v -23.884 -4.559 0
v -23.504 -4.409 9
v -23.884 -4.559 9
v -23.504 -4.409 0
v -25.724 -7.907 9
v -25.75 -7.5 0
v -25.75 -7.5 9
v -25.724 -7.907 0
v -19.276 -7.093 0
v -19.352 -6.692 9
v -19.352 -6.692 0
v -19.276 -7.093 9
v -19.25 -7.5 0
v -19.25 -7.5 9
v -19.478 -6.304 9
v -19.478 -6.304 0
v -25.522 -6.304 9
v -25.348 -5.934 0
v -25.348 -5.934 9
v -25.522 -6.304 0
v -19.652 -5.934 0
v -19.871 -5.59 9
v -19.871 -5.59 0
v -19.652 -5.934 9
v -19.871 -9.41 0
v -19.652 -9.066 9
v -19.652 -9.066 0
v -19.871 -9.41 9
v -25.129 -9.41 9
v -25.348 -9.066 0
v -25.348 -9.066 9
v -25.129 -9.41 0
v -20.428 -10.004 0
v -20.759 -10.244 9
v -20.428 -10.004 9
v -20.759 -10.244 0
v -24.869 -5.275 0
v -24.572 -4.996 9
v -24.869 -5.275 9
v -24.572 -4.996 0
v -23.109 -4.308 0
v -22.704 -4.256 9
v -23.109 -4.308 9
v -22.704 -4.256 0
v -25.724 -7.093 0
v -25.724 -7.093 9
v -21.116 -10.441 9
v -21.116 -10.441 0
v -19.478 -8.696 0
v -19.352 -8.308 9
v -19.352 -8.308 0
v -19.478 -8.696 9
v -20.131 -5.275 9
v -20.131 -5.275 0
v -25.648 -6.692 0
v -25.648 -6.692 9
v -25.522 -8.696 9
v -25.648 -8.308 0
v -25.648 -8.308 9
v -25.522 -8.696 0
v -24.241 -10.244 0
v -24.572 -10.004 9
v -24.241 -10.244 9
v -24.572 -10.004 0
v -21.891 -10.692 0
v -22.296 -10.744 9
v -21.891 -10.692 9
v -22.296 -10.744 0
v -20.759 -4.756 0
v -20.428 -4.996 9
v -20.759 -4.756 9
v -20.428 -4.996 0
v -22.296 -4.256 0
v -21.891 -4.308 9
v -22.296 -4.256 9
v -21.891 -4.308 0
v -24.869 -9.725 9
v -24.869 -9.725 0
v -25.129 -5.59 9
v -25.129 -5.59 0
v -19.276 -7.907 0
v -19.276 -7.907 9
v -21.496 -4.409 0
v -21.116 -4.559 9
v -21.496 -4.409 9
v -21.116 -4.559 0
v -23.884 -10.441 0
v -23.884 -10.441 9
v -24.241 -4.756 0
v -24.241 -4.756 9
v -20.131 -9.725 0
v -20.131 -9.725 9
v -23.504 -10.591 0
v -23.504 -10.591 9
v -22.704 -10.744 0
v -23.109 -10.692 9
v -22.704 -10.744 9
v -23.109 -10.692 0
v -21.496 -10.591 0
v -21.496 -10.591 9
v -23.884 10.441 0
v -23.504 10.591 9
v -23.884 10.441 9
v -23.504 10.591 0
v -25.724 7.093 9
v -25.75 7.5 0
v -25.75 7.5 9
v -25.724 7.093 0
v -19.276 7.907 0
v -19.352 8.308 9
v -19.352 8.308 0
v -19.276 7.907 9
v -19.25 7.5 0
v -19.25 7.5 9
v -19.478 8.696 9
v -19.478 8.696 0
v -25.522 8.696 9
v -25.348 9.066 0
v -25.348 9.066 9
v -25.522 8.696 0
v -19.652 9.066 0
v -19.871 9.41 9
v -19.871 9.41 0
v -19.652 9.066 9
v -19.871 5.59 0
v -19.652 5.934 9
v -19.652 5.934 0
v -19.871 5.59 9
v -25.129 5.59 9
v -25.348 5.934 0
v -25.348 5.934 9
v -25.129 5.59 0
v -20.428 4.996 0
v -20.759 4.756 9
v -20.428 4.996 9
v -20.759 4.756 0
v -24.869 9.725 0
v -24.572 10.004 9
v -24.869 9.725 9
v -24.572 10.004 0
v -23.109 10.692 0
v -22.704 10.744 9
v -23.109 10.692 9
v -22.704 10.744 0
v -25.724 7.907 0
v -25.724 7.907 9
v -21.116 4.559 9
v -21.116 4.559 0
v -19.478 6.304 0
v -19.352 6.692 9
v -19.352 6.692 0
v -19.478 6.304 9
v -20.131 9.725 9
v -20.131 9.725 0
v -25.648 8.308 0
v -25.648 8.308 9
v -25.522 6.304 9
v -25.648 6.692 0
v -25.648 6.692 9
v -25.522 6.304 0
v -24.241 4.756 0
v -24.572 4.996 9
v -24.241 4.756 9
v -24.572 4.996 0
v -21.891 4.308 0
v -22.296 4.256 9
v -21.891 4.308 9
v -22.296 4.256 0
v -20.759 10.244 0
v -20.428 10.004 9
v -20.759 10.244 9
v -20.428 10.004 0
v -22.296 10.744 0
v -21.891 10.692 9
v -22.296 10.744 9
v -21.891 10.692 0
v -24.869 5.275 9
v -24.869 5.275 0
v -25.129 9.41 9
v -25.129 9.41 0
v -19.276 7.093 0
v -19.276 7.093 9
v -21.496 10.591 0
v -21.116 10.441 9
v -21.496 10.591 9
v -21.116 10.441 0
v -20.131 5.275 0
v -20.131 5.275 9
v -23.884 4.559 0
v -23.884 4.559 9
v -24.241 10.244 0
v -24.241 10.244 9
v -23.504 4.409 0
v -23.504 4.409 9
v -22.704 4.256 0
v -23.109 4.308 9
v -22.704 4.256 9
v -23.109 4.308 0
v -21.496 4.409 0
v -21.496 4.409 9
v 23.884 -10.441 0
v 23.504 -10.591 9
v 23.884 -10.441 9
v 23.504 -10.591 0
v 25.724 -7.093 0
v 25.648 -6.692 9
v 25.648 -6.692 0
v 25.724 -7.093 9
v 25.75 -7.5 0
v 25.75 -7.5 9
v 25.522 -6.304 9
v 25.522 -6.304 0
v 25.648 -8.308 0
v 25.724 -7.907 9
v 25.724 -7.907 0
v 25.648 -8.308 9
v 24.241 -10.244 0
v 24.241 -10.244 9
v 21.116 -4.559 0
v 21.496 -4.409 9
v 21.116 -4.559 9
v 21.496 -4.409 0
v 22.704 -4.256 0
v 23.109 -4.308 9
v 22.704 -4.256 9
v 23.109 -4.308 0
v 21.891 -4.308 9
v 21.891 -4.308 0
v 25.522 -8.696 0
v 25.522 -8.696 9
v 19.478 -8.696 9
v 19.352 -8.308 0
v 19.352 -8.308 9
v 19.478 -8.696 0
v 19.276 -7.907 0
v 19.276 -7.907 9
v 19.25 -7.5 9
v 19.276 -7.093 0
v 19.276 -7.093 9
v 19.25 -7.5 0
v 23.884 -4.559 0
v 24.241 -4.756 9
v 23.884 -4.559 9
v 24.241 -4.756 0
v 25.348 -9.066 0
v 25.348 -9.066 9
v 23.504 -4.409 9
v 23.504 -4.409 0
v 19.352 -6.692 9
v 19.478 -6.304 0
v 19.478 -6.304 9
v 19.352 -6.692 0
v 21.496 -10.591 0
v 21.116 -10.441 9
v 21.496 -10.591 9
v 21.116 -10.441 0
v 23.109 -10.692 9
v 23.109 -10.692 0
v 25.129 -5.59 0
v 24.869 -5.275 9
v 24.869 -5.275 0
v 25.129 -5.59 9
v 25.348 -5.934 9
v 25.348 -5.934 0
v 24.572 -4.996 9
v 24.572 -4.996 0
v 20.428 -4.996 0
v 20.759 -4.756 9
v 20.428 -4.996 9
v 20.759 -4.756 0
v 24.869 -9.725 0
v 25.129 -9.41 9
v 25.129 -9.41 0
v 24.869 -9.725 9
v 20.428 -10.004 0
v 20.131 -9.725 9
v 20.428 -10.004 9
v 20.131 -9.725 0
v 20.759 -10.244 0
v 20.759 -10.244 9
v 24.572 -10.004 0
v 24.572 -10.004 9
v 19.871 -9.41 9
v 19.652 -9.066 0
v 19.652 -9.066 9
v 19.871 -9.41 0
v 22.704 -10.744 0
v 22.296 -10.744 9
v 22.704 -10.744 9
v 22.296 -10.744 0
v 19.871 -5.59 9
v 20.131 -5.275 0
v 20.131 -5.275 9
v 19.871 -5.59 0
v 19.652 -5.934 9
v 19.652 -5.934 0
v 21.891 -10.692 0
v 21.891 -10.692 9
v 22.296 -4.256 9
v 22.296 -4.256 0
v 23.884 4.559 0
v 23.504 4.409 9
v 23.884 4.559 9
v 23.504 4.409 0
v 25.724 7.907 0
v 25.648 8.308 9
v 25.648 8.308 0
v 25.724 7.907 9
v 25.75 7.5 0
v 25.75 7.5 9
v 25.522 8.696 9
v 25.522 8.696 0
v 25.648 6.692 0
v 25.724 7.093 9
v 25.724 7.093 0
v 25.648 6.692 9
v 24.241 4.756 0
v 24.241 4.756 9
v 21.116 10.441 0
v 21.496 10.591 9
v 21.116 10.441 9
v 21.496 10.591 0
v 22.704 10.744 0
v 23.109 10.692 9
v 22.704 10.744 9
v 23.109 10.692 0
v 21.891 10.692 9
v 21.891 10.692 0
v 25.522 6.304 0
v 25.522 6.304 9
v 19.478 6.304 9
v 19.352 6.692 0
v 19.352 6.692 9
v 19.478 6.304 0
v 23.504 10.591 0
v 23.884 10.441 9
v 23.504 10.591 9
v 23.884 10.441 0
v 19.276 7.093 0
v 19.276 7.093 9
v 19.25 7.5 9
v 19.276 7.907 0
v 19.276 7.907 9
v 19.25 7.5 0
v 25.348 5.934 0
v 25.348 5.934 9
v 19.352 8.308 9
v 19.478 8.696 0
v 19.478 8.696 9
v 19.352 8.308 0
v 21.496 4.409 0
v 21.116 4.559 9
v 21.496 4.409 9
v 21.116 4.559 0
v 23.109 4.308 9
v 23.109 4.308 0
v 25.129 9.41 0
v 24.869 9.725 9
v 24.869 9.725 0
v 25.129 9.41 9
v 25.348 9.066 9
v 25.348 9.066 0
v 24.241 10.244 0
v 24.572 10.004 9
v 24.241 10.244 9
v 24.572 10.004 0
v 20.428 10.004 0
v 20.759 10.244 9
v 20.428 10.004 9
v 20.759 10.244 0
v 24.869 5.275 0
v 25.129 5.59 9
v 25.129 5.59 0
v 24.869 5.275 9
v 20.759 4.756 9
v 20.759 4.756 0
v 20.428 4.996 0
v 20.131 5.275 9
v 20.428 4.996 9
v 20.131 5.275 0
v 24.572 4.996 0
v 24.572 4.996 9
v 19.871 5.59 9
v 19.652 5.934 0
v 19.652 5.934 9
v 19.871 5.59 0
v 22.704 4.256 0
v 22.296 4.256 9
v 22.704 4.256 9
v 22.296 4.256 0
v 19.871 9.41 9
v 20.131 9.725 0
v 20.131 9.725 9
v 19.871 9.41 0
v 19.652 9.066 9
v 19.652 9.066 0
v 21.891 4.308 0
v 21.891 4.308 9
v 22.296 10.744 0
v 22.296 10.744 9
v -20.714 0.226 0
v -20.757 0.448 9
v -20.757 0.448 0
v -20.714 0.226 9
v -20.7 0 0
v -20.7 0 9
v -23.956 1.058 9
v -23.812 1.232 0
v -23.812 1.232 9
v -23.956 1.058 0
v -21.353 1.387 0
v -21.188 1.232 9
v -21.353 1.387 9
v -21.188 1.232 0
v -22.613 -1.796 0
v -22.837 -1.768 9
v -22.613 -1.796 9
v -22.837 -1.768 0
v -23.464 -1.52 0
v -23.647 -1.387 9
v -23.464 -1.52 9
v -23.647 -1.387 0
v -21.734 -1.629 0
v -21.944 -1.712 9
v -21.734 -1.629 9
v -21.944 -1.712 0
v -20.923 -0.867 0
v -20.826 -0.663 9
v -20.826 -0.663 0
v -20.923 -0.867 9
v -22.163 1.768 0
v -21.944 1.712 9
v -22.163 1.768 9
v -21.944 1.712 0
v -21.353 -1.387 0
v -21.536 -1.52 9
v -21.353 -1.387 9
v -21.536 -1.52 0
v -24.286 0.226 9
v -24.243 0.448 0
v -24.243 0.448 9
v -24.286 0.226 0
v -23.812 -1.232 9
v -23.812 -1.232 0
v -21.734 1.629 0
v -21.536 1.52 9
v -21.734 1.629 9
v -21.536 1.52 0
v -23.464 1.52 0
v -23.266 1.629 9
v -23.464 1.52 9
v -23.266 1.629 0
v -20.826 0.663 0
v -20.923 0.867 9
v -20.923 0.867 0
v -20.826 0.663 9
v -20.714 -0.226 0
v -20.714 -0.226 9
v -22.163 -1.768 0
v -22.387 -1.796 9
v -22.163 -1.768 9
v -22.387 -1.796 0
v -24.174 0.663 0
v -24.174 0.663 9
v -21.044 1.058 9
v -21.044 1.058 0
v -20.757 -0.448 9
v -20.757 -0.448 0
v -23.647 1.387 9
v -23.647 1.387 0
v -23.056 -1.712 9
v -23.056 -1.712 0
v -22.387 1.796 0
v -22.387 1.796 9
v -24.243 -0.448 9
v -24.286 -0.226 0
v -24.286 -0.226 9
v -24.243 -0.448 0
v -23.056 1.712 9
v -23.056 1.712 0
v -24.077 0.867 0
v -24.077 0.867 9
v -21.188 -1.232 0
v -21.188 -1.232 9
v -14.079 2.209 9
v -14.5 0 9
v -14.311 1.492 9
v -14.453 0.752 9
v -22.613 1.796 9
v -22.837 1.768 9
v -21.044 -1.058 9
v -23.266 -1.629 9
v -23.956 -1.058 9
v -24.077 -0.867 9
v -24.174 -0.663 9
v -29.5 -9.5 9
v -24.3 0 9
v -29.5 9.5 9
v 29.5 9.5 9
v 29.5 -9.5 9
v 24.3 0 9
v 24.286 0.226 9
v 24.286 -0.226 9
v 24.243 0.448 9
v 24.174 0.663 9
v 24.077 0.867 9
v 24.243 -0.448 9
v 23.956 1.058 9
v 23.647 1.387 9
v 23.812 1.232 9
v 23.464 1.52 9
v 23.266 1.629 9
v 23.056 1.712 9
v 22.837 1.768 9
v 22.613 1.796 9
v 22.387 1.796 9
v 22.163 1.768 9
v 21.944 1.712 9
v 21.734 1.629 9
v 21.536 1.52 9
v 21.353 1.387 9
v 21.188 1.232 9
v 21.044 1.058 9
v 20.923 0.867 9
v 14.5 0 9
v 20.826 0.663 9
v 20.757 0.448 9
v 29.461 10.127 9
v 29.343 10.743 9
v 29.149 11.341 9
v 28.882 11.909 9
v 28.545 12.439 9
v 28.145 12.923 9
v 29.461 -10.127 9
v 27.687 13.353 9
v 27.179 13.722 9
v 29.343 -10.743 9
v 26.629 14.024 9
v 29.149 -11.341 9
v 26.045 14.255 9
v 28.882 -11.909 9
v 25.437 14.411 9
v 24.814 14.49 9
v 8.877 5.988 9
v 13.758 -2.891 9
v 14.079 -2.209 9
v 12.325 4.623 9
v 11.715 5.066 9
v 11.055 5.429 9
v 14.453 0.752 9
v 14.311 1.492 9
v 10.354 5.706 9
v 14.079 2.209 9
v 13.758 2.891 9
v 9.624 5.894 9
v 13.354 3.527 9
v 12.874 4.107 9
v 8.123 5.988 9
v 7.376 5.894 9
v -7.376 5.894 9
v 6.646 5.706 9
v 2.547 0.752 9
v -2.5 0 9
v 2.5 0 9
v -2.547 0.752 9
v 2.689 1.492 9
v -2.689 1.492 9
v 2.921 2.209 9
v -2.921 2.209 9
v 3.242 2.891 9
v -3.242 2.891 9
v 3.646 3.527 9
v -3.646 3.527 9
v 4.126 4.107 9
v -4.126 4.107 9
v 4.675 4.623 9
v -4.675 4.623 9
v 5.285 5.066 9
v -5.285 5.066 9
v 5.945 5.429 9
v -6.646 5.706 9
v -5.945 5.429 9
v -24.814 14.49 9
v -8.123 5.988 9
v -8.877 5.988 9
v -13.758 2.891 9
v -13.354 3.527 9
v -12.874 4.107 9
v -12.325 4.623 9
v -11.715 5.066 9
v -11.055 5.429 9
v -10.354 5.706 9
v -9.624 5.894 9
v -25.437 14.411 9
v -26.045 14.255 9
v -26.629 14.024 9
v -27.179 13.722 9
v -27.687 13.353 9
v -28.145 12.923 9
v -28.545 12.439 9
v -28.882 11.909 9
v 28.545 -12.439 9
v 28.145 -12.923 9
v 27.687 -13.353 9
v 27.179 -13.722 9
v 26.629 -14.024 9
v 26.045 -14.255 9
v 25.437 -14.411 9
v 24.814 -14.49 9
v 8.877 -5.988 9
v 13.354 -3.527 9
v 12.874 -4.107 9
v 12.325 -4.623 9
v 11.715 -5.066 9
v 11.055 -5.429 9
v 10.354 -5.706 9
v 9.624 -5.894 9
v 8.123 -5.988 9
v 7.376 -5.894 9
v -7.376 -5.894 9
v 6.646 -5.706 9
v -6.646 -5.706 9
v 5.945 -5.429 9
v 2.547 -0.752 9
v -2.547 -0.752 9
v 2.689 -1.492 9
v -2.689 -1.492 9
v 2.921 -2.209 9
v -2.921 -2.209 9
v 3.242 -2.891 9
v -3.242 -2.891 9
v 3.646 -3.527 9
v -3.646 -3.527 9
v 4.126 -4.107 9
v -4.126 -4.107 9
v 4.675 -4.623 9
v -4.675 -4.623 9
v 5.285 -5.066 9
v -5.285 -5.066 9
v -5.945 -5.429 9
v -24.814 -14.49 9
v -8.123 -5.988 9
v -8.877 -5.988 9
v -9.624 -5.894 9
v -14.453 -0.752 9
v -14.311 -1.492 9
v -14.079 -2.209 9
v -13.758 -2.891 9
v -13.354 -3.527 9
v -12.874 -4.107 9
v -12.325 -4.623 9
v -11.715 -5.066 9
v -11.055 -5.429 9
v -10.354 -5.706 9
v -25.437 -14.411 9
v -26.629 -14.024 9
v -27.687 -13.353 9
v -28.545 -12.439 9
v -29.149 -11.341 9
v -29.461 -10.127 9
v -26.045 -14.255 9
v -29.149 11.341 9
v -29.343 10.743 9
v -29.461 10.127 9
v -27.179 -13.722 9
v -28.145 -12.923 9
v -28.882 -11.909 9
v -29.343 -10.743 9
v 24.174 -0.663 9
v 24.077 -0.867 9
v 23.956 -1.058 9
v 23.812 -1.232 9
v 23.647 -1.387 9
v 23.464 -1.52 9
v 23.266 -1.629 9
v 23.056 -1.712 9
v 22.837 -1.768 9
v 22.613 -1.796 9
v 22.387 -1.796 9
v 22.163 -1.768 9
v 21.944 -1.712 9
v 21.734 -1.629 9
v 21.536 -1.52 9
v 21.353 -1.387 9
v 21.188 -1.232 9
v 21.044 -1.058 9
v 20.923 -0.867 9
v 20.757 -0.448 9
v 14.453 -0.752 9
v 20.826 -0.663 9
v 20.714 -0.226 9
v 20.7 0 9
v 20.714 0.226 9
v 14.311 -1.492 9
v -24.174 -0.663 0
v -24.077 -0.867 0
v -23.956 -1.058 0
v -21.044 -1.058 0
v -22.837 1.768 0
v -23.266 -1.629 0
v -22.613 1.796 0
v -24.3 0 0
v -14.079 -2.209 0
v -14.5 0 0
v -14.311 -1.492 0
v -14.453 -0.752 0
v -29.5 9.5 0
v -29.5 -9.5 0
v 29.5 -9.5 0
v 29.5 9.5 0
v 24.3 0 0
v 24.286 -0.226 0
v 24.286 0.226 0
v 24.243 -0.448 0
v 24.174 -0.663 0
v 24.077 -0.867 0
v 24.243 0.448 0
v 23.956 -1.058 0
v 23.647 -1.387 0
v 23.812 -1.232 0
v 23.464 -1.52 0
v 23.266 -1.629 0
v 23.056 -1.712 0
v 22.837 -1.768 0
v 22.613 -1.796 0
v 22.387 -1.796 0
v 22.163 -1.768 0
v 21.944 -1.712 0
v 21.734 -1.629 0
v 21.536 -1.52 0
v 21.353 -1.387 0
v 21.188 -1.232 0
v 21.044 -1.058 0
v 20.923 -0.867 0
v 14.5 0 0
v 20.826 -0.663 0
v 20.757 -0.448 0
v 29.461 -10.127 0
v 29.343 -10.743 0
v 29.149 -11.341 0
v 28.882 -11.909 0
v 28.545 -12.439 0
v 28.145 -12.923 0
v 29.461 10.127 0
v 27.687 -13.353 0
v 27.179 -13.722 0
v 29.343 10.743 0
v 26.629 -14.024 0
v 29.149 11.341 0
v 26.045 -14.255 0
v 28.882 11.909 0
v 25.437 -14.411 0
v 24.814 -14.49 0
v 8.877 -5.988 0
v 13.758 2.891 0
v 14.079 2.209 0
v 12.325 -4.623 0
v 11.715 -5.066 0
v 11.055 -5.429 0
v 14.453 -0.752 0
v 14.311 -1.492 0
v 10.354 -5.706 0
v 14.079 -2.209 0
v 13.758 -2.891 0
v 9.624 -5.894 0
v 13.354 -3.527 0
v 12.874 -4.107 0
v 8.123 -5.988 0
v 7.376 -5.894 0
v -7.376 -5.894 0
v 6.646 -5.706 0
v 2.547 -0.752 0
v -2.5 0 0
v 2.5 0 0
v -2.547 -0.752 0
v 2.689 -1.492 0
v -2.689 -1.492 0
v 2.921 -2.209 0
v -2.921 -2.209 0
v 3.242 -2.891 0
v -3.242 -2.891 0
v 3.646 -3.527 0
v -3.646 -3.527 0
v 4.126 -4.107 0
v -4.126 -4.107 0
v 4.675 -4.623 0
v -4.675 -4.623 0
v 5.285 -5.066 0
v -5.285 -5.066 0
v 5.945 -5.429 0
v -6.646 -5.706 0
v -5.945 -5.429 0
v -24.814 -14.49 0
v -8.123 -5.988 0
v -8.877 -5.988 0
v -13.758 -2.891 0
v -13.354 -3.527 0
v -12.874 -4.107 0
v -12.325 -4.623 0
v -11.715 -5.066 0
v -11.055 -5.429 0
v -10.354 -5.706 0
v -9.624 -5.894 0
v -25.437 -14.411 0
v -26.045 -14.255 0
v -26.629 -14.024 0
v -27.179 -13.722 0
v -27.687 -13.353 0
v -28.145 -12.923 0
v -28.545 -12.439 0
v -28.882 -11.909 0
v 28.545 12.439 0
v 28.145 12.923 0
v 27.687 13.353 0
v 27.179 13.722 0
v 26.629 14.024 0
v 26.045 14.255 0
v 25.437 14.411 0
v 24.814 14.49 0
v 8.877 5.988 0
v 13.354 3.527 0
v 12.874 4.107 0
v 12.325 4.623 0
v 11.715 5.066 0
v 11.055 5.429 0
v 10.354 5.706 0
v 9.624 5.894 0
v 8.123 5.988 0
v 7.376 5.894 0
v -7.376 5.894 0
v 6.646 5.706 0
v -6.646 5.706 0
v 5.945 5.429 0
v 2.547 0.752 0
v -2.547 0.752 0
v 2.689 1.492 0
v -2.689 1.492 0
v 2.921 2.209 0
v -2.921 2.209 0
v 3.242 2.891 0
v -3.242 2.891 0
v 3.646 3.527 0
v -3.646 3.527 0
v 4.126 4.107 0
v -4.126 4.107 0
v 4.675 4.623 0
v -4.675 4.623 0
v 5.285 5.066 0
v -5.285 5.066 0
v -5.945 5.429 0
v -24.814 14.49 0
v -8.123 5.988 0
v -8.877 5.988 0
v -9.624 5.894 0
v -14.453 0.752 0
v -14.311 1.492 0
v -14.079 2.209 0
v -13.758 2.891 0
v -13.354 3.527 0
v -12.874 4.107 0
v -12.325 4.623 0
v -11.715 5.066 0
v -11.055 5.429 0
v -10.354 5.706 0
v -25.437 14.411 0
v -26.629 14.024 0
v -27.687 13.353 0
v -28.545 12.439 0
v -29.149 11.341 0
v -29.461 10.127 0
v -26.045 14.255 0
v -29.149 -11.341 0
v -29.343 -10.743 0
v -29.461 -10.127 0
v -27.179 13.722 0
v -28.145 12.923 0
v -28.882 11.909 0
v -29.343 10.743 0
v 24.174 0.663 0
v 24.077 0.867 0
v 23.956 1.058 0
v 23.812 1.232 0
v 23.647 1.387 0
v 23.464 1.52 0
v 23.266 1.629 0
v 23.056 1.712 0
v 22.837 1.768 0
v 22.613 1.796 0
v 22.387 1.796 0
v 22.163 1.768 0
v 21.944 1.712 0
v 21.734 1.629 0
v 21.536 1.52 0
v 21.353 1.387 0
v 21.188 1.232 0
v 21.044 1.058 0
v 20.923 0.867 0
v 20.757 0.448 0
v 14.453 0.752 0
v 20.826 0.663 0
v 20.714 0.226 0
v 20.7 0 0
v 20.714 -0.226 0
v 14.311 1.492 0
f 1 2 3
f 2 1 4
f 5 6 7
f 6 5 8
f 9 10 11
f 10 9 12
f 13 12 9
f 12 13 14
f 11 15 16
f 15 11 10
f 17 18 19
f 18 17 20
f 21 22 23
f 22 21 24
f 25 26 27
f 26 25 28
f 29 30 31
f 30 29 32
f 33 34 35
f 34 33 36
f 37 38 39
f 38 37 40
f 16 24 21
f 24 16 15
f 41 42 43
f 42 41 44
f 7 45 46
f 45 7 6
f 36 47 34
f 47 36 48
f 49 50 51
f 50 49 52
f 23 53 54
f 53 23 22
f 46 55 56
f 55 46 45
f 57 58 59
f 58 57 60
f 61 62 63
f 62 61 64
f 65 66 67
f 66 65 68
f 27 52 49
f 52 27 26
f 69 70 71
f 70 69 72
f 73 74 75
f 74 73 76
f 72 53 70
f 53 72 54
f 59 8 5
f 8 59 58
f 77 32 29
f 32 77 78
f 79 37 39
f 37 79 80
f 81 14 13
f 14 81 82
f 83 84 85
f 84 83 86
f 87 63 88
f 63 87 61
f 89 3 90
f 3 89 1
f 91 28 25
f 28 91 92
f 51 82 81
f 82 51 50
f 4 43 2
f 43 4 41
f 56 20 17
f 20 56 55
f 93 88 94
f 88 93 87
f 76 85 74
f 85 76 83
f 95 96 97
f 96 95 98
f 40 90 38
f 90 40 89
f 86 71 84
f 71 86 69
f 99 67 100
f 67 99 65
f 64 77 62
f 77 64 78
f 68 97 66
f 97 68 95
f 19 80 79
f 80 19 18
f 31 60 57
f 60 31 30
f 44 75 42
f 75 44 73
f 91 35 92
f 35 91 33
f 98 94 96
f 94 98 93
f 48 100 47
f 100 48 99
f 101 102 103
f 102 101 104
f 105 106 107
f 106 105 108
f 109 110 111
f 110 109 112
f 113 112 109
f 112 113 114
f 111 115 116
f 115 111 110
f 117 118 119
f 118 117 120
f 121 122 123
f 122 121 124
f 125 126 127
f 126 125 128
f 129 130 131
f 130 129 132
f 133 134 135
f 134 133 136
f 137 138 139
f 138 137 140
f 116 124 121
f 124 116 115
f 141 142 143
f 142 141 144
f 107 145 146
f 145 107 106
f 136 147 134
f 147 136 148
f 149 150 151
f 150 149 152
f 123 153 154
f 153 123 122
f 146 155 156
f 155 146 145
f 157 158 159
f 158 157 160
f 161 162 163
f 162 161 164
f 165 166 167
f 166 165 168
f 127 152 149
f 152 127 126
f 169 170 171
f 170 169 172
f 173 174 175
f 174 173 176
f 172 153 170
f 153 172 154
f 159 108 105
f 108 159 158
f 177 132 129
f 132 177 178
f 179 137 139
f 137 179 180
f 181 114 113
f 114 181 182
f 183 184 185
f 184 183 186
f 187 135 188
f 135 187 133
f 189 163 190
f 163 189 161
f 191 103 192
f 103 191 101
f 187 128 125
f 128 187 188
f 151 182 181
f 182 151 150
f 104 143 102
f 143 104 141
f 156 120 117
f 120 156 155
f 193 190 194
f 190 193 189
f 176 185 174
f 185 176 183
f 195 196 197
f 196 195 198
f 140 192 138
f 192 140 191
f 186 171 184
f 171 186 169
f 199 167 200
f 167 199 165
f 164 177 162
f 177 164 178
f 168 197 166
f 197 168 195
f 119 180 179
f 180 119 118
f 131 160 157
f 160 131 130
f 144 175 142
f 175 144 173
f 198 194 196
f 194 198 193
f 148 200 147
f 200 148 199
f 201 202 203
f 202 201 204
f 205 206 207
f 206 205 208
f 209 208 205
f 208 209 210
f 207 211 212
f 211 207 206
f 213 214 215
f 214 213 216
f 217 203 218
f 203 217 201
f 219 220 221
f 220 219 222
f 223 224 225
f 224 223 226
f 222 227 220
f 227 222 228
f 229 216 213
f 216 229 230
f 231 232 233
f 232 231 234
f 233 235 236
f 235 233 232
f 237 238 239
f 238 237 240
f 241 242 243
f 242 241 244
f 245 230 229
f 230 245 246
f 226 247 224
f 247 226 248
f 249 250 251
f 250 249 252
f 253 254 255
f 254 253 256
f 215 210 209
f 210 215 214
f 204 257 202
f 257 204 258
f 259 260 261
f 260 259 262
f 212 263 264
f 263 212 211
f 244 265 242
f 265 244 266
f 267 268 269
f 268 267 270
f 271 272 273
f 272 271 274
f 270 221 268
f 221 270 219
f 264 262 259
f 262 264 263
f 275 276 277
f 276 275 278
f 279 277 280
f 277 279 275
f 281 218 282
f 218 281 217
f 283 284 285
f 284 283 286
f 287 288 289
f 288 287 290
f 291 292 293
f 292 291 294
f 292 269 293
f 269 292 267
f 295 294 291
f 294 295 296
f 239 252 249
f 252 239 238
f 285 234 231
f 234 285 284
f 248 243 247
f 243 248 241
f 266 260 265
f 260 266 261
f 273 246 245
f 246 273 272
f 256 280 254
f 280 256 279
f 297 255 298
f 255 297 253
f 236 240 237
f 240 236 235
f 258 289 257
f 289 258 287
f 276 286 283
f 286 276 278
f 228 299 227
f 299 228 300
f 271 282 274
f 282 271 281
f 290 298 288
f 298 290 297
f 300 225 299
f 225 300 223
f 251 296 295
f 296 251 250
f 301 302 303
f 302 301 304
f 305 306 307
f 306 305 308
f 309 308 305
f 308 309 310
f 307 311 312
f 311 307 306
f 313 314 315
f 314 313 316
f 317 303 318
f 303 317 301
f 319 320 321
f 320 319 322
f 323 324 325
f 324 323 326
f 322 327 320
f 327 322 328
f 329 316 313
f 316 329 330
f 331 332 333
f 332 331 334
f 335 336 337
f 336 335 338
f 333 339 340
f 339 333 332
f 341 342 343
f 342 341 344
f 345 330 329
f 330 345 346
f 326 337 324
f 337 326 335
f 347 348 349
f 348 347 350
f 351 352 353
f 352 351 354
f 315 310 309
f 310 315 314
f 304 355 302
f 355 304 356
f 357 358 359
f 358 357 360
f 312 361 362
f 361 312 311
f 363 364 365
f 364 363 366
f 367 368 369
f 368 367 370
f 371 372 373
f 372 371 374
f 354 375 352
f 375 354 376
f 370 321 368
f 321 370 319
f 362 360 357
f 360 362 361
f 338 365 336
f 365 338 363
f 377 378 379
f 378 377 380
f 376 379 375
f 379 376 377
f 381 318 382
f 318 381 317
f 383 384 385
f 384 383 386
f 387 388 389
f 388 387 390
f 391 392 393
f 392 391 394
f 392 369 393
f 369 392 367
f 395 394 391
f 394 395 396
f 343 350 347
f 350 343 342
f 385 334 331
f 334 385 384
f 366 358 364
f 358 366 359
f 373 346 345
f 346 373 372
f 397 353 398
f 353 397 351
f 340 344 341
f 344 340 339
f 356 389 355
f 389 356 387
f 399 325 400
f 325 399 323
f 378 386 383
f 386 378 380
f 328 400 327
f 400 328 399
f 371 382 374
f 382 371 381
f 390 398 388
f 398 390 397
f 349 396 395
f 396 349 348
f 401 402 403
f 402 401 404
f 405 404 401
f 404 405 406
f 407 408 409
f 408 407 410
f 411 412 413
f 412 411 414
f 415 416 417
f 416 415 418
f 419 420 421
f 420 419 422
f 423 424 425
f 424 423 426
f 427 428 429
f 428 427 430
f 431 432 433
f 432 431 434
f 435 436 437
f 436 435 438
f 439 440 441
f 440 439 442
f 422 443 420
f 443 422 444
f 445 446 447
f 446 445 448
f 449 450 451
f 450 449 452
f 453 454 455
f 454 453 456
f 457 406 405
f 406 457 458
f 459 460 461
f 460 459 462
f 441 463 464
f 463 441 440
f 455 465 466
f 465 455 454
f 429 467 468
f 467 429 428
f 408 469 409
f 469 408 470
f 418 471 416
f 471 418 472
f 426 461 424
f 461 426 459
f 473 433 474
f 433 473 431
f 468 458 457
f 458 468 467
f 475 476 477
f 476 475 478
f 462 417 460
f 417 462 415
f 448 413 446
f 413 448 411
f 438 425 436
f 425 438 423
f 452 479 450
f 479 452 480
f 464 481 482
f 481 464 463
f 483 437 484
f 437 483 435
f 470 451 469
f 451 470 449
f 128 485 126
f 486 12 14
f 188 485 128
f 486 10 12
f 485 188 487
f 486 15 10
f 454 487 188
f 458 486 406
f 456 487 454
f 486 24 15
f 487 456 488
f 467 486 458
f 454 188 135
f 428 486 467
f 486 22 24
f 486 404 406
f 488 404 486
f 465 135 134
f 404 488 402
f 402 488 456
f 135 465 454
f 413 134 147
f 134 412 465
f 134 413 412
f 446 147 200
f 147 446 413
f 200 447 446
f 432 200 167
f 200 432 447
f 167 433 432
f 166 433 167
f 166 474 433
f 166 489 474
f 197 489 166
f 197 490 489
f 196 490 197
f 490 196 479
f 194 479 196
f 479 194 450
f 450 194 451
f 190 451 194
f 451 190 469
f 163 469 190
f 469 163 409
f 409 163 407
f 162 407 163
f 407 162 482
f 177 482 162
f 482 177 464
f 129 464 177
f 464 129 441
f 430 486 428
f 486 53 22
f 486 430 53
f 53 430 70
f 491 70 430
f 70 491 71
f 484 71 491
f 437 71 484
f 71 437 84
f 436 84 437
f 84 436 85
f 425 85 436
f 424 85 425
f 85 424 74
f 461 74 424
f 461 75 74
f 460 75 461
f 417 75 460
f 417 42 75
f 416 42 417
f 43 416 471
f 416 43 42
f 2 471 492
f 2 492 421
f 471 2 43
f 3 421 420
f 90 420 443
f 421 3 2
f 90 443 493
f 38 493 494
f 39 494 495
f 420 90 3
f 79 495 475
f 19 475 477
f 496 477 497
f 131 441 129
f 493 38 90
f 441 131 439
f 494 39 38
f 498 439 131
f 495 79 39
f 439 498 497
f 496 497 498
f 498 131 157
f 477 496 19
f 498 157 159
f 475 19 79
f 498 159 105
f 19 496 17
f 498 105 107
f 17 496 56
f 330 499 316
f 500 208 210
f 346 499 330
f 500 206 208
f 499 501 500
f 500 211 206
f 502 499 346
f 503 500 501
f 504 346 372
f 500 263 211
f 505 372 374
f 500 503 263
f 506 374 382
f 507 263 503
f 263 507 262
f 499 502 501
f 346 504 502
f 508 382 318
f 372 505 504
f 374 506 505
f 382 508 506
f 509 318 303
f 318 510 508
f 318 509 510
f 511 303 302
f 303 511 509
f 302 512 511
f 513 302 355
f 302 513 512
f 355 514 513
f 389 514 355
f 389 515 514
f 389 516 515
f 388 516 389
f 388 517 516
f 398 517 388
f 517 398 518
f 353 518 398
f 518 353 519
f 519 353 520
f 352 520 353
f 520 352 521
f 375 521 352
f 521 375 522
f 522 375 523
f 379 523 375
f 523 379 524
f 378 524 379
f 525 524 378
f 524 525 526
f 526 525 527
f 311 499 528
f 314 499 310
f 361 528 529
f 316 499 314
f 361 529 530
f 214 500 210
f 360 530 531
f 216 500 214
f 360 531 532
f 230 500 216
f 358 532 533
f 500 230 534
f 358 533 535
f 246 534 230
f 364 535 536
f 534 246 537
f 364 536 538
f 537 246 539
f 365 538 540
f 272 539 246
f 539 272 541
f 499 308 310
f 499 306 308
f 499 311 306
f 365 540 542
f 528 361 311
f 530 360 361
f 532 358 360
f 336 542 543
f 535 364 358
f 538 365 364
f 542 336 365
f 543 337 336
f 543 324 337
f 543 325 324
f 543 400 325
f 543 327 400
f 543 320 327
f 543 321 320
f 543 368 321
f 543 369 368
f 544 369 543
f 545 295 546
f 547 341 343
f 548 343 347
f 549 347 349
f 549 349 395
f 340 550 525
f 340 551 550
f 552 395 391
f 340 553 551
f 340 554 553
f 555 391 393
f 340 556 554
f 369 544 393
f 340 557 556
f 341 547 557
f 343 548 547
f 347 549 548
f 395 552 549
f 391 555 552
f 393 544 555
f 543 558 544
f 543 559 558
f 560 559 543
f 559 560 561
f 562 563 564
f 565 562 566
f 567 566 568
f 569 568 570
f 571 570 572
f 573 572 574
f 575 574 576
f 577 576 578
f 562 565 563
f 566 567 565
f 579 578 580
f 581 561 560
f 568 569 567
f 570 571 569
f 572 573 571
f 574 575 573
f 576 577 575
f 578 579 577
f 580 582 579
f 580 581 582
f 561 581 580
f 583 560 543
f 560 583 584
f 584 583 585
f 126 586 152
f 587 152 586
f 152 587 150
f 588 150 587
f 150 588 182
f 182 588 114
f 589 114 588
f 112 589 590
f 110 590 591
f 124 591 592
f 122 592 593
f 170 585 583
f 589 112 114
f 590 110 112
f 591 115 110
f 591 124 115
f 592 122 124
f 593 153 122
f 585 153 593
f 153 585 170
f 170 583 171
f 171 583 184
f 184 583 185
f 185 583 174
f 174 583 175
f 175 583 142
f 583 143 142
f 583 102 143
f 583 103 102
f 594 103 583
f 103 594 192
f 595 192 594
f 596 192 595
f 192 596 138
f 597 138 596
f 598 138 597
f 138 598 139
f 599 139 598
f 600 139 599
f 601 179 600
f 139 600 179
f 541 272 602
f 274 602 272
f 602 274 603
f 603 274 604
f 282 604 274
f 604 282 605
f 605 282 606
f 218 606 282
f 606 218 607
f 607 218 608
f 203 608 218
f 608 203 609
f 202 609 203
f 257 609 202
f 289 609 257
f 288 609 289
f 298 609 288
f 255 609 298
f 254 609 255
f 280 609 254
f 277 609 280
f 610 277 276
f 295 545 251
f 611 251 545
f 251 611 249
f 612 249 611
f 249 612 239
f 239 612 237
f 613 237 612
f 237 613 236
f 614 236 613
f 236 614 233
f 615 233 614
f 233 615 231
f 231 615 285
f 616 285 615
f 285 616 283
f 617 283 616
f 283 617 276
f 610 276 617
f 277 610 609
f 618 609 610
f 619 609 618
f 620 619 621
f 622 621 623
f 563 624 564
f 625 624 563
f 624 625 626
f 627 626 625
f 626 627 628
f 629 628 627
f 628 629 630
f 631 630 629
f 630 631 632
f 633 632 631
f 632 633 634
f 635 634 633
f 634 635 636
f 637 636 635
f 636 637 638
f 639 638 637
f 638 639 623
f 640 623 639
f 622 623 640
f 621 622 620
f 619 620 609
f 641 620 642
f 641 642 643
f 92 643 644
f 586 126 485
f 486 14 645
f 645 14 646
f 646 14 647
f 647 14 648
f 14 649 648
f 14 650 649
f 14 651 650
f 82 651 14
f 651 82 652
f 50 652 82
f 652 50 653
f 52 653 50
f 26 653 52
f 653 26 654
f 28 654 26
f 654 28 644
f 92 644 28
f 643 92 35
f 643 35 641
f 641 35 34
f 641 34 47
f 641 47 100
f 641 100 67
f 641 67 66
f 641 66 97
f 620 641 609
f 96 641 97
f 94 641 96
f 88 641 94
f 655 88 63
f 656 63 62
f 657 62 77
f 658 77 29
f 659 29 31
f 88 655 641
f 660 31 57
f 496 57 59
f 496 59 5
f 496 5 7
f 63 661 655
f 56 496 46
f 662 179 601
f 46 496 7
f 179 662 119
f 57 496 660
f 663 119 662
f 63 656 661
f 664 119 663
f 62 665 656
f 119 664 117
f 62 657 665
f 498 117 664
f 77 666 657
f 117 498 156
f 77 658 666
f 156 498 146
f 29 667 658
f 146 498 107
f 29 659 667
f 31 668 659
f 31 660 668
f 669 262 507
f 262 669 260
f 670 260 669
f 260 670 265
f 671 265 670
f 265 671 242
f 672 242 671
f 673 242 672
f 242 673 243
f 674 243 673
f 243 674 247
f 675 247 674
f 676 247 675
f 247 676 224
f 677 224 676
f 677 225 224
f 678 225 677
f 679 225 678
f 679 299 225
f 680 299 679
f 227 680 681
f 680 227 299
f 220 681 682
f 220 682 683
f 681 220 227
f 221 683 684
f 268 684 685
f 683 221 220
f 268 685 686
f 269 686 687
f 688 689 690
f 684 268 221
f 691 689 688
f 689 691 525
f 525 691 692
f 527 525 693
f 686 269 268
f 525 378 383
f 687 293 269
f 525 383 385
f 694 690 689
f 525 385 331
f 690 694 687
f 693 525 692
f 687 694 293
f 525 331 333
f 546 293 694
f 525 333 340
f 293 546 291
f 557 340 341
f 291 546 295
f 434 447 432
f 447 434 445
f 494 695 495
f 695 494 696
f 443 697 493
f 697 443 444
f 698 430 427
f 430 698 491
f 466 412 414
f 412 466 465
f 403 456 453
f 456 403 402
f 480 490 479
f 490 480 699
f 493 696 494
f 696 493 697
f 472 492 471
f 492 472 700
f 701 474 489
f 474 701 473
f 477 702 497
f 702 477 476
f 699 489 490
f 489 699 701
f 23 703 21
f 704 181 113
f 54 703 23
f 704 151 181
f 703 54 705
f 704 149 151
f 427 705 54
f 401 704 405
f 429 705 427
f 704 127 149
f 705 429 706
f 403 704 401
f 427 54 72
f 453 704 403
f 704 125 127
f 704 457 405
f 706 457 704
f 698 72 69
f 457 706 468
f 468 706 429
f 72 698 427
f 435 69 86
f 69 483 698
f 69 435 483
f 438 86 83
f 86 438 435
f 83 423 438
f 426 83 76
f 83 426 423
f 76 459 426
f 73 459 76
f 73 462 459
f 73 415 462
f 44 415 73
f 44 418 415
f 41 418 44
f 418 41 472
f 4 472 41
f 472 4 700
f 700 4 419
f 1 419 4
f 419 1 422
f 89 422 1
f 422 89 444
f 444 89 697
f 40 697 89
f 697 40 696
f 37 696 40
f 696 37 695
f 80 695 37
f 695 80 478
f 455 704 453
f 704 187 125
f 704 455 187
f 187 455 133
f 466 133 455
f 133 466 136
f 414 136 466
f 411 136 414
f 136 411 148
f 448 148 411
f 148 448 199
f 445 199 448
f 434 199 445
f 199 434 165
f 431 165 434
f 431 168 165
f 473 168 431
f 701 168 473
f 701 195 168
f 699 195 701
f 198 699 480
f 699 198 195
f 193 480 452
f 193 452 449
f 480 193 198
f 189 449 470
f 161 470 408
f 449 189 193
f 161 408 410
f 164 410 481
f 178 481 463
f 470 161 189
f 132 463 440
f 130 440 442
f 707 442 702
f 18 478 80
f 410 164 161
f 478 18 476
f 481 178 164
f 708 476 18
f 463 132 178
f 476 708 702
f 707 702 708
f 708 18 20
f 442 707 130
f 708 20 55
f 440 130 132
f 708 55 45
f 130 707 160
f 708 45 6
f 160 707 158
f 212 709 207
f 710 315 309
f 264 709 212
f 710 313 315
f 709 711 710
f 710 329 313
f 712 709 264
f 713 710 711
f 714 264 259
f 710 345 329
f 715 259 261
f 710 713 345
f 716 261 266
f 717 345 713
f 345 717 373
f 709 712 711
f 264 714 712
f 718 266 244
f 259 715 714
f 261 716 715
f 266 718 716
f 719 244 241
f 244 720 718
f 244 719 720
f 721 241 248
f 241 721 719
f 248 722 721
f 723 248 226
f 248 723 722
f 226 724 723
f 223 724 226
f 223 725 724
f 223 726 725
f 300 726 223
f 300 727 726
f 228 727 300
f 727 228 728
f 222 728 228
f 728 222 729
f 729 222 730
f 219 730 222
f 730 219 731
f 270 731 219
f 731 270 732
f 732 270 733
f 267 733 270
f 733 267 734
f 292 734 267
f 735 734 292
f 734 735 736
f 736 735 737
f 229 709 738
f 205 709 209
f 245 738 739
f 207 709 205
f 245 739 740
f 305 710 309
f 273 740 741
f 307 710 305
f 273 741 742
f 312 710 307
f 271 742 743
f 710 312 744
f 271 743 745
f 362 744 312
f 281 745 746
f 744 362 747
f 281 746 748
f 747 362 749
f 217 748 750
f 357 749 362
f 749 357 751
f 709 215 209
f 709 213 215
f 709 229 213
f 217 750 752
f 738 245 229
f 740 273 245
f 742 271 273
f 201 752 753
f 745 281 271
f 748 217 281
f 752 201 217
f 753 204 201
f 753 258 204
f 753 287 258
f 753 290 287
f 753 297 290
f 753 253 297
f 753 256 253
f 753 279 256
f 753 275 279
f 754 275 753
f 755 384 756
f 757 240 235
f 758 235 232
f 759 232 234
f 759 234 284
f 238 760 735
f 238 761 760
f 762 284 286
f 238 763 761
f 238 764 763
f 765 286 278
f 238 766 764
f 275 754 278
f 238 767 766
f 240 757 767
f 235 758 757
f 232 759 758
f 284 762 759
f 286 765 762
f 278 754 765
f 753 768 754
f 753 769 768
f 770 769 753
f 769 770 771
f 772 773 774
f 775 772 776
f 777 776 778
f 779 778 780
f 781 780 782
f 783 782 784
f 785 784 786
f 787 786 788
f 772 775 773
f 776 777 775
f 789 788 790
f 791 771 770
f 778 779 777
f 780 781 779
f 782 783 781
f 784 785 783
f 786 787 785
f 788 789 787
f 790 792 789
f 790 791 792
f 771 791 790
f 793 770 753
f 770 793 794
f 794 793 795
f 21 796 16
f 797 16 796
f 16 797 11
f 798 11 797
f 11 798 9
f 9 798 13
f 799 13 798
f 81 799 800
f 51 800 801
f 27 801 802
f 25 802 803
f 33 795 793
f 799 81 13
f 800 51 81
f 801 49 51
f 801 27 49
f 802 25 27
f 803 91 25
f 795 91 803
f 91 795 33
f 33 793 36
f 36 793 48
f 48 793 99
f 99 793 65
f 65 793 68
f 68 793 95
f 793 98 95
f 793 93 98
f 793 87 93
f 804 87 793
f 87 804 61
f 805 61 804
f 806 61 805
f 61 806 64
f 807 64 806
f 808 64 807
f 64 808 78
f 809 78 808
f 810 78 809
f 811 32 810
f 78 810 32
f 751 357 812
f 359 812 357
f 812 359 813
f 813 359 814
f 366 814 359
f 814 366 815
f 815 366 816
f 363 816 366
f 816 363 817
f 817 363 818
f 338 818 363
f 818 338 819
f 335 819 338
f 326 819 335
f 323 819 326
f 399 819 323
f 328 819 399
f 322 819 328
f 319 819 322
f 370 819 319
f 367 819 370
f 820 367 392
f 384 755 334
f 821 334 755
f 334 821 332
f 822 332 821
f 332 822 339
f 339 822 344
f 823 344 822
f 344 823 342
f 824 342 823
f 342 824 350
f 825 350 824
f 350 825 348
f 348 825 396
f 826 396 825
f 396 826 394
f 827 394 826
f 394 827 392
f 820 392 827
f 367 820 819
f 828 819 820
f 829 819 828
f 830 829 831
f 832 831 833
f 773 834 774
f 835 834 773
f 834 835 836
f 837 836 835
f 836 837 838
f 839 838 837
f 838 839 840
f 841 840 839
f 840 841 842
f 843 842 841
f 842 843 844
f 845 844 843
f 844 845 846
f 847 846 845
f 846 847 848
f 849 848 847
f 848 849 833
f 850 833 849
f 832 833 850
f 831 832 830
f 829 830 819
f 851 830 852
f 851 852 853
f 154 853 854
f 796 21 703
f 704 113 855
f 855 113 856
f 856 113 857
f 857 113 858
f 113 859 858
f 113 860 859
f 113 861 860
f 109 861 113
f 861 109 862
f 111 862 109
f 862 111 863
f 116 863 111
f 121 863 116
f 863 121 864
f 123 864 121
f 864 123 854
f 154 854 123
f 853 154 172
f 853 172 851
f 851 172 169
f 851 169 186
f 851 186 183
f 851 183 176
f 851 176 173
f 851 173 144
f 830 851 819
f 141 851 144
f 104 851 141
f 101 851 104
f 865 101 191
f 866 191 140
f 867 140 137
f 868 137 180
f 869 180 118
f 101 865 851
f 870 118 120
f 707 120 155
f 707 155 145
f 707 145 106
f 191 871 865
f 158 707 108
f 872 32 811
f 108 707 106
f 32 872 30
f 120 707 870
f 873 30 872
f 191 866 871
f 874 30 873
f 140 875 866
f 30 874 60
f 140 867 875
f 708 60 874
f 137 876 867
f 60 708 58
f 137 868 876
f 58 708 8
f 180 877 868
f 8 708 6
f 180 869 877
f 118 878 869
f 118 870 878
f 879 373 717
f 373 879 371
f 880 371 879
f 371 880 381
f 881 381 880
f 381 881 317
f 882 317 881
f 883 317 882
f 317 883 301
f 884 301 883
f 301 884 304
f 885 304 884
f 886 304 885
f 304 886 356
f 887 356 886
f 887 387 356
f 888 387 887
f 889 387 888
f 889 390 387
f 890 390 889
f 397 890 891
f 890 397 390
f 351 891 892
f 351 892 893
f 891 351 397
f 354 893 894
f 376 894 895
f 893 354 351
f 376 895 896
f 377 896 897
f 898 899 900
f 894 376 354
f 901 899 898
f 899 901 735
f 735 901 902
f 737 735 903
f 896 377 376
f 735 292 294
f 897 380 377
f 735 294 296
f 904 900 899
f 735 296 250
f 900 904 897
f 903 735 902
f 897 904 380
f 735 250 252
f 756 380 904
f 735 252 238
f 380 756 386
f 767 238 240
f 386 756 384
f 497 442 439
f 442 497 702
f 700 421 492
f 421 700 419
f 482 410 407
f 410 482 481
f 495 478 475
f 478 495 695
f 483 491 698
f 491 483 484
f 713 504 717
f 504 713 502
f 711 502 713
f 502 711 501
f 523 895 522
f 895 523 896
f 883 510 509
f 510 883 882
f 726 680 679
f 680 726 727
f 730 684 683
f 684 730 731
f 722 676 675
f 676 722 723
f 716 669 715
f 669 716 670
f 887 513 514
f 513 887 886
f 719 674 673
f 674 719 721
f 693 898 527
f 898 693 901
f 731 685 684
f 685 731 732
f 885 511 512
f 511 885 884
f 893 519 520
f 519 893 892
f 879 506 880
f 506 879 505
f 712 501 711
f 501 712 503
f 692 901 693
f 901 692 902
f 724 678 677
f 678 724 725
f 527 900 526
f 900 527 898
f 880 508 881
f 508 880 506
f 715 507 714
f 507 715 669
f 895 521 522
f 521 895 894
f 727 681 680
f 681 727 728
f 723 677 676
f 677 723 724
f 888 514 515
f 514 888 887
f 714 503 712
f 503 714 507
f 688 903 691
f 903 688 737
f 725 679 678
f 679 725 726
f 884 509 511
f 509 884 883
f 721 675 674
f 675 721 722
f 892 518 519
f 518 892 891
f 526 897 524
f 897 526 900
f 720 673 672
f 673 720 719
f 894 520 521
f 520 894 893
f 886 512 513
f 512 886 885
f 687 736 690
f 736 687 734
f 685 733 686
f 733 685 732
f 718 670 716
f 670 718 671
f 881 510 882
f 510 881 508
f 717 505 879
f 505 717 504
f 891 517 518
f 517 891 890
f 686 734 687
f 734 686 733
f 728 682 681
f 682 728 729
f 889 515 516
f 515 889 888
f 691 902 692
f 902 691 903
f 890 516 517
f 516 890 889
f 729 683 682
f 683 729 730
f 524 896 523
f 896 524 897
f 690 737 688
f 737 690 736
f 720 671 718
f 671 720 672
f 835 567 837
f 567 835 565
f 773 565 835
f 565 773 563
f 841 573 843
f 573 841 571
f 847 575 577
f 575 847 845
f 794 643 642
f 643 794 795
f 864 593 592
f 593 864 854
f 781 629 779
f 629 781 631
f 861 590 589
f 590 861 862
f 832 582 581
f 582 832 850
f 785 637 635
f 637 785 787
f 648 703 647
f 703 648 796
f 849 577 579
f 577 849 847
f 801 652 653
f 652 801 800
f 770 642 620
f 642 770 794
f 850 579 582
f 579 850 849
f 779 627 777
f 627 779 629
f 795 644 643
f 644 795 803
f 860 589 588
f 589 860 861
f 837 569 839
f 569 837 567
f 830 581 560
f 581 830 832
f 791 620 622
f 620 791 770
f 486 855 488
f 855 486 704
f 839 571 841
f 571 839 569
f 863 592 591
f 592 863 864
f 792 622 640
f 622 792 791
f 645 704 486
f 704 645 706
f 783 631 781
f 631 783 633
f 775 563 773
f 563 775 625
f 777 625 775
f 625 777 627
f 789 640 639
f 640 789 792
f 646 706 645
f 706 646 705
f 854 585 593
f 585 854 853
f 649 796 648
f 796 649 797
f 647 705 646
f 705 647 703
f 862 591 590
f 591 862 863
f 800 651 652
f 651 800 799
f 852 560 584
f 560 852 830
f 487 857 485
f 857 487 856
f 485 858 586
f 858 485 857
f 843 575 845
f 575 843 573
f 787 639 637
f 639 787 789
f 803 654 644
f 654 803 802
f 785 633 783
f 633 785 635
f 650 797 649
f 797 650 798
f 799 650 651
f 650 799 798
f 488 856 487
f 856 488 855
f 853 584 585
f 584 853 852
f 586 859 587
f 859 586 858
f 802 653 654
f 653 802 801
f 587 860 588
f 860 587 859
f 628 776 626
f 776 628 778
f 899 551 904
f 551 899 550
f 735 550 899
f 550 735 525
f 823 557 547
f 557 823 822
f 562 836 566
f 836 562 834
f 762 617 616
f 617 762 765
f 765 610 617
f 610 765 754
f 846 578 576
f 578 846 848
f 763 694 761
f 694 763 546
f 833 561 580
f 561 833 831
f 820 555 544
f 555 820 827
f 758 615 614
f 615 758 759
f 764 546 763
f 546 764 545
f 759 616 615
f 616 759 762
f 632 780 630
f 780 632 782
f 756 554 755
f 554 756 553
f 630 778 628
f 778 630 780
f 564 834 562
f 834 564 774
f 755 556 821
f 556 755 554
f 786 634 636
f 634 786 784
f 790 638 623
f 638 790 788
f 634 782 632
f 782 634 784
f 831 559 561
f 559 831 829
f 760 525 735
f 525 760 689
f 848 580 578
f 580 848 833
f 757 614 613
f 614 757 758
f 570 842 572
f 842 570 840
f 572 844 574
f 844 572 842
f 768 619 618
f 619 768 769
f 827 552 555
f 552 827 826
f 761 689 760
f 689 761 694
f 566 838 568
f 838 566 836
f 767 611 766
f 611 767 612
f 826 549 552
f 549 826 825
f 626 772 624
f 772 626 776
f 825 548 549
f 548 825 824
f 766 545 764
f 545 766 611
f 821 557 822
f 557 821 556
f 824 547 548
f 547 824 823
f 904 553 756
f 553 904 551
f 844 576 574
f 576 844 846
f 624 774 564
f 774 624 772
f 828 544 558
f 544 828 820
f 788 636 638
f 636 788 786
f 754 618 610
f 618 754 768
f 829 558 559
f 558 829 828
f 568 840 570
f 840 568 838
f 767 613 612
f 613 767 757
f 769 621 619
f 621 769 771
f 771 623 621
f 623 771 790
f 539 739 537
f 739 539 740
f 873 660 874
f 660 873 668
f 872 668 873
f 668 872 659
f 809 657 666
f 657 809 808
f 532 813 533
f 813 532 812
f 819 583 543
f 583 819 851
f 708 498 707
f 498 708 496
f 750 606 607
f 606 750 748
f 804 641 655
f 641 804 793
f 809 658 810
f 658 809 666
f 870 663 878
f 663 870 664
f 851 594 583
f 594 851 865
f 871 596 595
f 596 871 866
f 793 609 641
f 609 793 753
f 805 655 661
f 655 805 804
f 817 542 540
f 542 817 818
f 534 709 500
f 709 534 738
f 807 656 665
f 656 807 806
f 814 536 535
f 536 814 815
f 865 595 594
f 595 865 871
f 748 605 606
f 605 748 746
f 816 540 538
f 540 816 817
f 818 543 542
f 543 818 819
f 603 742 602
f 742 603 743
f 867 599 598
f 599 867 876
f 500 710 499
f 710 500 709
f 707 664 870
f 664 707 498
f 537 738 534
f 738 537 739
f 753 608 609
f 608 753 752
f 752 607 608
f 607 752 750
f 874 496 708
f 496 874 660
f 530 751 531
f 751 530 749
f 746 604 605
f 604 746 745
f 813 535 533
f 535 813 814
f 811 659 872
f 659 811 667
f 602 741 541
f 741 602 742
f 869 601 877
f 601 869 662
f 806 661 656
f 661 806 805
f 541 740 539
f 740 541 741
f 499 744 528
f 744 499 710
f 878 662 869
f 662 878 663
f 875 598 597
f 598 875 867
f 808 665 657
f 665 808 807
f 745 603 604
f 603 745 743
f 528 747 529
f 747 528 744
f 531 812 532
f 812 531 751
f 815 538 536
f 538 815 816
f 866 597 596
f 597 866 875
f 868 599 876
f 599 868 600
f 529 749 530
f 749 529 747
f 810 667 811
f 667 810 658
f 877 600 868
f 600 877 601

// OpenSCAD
$fn = 50;


difference() {
	union() {
		hull() {
			translate(v = [-24.5000000000, 9.5000000000, 0]) {
				cylinder(h = 9, r = 5);
			}
			translate(v = [24.5000000000, 9.5000000000, 0]) {
				cylinder(h = 9, r = 5);
			}
			translate(v = [-24.5000000000, -9.5000000000, 0]) {
				cylinder(h = 9, r = 5);
			}
			translate(v = [24.5000000000, -9.5000000000, 0]) {
				cylinder(h = 9, r = 5);
			}
		}
	}
	union() {
		#translate(v = [-22.5000000000, -7.5000000000, 0]) {
			cylinder(h = 9, r = 3.2500000000);
		}
		#translate(v = [-22.5000000000, 7.5000000000, 0]) {
			cylinder(h = 9, r = 3.2500000000);
		}
		#translate(v = [22.5000000000, -7.5000000000, 0]) {
			cylinder(h = 9, r = 3.2500000000);
		}
		#translate(v = [22.5000000000, 7.5000000000, 0]) {
			cylinder(h = 9, r = 3.2500000000);
		}
		#translate(v = [-22.5000000000, -7.5000000000, -100.0000000000]) {
			cylinder(h = 200, r = 3.2500000000);
		}
		#translate(v = [-22.5000000000, 7.5000000000, -100.0000000000]) {
			cylinder(h = 200, r = 3.2500000000);
		}
		#translate(v = [22.5000000000, -7.5000000000, -100.0000000000]) {
			cylinder(h = 200, r = 3.2500000000);
		}
		#translate(v = [22.5000000000, 7.5000000000, -100.0000000000]) {
			cylinder(h = 200, r = 3.2500000000);
		}
		#translate(v = [-22.5000000000, -7.5000000000, 0]) {
			cylinder(h = 9, r = 1.8000000000);
		}
		#translate(v = [-22.5000000000, 0.0000000000, 0]) {
			cylinder(h = 9, r = 1.8000000000);
		}
		#translate(v = [-22.5000000000, 7.5000000000, 0]) {
			cylinder(h = 9, r = 1.8000000000);
		}
		#translate(v = [22.5000000000, -7.5000000000, 0]) {
			cylinder(h = 9, r = 1.8000000000);
		}
		#translate(v = [22.5000000000, 0.0000000000, 0]) {
			cylinder(h = 9, r = 1.8000000000);
		}
		#translate(v = [22.5000000000, 7.5000000000, 0]) {
			cylinder(h = 9, r = 1.8000000000);
		}
		#translate(v = [-22.5000000000, -7.5000000000, 0]) {
			cylinder(h = 9, r = 1.8000000000);
		}
		#translate(v = [-22.5000000000, 0.0000000000, 0]) {
			cylinder(h = 9, r = 1.8000000000);
		}
		#translate(v = [-22.5000000000, 7.5000000000, 0]) {
			cylinder(h = 9, r = 1.8000000000);
		}
		#translate(v = [22.5000000000, -7.5000000000, 0]) {
			cylinder(h = 9, r = 1.8000000000);
		}
		#translate(v = [22.5000000000, 0.0000000000, 0]) {
			cylinder(h = 9, r = 1.8000000000);
		}
		#translate(v = [22.5000000000, 7.5000000000, 0]) {
			cylinder(h = 9, r = 1.8000000000);
		}
		#translate(v = [-22.5000000000, -7.5000000000, 0]) {
			cylinder(h = 9, r = 1.8000000000);
		}
		#translate(v = [-22.5000000000, 0.0000000000, 0]) {
			cylinder(h = 9, r = 1.8000000000);
		}
		#translate(v = [-22.5000000000, 7.5000000000, 0]) {
			cylinder(h = 9, r = 1.8000000000);
		}
		#translate(v = [22.5000000000, -7.5000000000, 0]) {
			cylinder(h = 9, r = 1.8000000000);
		}
		#translate(v = [22.5000000000, 0.0000000000, 0]) {
			cylinder(h = 9, r = 1.8000000000);
		}
		#translate(v = [22.5000000000, 7.5000000000, 0]) {
			cylinder(h = 9, r = 1.8000000000);
		}
		#translate(v = [-8.5000000000, 0, 0]) {
			cylinder(h = 9, r = 6.0000000000);
		}
		#translate(v = [8.5000000000, 0, 0]) {
			cylinder(h = 9, r = 6.0000000000);
		}
	}
}
